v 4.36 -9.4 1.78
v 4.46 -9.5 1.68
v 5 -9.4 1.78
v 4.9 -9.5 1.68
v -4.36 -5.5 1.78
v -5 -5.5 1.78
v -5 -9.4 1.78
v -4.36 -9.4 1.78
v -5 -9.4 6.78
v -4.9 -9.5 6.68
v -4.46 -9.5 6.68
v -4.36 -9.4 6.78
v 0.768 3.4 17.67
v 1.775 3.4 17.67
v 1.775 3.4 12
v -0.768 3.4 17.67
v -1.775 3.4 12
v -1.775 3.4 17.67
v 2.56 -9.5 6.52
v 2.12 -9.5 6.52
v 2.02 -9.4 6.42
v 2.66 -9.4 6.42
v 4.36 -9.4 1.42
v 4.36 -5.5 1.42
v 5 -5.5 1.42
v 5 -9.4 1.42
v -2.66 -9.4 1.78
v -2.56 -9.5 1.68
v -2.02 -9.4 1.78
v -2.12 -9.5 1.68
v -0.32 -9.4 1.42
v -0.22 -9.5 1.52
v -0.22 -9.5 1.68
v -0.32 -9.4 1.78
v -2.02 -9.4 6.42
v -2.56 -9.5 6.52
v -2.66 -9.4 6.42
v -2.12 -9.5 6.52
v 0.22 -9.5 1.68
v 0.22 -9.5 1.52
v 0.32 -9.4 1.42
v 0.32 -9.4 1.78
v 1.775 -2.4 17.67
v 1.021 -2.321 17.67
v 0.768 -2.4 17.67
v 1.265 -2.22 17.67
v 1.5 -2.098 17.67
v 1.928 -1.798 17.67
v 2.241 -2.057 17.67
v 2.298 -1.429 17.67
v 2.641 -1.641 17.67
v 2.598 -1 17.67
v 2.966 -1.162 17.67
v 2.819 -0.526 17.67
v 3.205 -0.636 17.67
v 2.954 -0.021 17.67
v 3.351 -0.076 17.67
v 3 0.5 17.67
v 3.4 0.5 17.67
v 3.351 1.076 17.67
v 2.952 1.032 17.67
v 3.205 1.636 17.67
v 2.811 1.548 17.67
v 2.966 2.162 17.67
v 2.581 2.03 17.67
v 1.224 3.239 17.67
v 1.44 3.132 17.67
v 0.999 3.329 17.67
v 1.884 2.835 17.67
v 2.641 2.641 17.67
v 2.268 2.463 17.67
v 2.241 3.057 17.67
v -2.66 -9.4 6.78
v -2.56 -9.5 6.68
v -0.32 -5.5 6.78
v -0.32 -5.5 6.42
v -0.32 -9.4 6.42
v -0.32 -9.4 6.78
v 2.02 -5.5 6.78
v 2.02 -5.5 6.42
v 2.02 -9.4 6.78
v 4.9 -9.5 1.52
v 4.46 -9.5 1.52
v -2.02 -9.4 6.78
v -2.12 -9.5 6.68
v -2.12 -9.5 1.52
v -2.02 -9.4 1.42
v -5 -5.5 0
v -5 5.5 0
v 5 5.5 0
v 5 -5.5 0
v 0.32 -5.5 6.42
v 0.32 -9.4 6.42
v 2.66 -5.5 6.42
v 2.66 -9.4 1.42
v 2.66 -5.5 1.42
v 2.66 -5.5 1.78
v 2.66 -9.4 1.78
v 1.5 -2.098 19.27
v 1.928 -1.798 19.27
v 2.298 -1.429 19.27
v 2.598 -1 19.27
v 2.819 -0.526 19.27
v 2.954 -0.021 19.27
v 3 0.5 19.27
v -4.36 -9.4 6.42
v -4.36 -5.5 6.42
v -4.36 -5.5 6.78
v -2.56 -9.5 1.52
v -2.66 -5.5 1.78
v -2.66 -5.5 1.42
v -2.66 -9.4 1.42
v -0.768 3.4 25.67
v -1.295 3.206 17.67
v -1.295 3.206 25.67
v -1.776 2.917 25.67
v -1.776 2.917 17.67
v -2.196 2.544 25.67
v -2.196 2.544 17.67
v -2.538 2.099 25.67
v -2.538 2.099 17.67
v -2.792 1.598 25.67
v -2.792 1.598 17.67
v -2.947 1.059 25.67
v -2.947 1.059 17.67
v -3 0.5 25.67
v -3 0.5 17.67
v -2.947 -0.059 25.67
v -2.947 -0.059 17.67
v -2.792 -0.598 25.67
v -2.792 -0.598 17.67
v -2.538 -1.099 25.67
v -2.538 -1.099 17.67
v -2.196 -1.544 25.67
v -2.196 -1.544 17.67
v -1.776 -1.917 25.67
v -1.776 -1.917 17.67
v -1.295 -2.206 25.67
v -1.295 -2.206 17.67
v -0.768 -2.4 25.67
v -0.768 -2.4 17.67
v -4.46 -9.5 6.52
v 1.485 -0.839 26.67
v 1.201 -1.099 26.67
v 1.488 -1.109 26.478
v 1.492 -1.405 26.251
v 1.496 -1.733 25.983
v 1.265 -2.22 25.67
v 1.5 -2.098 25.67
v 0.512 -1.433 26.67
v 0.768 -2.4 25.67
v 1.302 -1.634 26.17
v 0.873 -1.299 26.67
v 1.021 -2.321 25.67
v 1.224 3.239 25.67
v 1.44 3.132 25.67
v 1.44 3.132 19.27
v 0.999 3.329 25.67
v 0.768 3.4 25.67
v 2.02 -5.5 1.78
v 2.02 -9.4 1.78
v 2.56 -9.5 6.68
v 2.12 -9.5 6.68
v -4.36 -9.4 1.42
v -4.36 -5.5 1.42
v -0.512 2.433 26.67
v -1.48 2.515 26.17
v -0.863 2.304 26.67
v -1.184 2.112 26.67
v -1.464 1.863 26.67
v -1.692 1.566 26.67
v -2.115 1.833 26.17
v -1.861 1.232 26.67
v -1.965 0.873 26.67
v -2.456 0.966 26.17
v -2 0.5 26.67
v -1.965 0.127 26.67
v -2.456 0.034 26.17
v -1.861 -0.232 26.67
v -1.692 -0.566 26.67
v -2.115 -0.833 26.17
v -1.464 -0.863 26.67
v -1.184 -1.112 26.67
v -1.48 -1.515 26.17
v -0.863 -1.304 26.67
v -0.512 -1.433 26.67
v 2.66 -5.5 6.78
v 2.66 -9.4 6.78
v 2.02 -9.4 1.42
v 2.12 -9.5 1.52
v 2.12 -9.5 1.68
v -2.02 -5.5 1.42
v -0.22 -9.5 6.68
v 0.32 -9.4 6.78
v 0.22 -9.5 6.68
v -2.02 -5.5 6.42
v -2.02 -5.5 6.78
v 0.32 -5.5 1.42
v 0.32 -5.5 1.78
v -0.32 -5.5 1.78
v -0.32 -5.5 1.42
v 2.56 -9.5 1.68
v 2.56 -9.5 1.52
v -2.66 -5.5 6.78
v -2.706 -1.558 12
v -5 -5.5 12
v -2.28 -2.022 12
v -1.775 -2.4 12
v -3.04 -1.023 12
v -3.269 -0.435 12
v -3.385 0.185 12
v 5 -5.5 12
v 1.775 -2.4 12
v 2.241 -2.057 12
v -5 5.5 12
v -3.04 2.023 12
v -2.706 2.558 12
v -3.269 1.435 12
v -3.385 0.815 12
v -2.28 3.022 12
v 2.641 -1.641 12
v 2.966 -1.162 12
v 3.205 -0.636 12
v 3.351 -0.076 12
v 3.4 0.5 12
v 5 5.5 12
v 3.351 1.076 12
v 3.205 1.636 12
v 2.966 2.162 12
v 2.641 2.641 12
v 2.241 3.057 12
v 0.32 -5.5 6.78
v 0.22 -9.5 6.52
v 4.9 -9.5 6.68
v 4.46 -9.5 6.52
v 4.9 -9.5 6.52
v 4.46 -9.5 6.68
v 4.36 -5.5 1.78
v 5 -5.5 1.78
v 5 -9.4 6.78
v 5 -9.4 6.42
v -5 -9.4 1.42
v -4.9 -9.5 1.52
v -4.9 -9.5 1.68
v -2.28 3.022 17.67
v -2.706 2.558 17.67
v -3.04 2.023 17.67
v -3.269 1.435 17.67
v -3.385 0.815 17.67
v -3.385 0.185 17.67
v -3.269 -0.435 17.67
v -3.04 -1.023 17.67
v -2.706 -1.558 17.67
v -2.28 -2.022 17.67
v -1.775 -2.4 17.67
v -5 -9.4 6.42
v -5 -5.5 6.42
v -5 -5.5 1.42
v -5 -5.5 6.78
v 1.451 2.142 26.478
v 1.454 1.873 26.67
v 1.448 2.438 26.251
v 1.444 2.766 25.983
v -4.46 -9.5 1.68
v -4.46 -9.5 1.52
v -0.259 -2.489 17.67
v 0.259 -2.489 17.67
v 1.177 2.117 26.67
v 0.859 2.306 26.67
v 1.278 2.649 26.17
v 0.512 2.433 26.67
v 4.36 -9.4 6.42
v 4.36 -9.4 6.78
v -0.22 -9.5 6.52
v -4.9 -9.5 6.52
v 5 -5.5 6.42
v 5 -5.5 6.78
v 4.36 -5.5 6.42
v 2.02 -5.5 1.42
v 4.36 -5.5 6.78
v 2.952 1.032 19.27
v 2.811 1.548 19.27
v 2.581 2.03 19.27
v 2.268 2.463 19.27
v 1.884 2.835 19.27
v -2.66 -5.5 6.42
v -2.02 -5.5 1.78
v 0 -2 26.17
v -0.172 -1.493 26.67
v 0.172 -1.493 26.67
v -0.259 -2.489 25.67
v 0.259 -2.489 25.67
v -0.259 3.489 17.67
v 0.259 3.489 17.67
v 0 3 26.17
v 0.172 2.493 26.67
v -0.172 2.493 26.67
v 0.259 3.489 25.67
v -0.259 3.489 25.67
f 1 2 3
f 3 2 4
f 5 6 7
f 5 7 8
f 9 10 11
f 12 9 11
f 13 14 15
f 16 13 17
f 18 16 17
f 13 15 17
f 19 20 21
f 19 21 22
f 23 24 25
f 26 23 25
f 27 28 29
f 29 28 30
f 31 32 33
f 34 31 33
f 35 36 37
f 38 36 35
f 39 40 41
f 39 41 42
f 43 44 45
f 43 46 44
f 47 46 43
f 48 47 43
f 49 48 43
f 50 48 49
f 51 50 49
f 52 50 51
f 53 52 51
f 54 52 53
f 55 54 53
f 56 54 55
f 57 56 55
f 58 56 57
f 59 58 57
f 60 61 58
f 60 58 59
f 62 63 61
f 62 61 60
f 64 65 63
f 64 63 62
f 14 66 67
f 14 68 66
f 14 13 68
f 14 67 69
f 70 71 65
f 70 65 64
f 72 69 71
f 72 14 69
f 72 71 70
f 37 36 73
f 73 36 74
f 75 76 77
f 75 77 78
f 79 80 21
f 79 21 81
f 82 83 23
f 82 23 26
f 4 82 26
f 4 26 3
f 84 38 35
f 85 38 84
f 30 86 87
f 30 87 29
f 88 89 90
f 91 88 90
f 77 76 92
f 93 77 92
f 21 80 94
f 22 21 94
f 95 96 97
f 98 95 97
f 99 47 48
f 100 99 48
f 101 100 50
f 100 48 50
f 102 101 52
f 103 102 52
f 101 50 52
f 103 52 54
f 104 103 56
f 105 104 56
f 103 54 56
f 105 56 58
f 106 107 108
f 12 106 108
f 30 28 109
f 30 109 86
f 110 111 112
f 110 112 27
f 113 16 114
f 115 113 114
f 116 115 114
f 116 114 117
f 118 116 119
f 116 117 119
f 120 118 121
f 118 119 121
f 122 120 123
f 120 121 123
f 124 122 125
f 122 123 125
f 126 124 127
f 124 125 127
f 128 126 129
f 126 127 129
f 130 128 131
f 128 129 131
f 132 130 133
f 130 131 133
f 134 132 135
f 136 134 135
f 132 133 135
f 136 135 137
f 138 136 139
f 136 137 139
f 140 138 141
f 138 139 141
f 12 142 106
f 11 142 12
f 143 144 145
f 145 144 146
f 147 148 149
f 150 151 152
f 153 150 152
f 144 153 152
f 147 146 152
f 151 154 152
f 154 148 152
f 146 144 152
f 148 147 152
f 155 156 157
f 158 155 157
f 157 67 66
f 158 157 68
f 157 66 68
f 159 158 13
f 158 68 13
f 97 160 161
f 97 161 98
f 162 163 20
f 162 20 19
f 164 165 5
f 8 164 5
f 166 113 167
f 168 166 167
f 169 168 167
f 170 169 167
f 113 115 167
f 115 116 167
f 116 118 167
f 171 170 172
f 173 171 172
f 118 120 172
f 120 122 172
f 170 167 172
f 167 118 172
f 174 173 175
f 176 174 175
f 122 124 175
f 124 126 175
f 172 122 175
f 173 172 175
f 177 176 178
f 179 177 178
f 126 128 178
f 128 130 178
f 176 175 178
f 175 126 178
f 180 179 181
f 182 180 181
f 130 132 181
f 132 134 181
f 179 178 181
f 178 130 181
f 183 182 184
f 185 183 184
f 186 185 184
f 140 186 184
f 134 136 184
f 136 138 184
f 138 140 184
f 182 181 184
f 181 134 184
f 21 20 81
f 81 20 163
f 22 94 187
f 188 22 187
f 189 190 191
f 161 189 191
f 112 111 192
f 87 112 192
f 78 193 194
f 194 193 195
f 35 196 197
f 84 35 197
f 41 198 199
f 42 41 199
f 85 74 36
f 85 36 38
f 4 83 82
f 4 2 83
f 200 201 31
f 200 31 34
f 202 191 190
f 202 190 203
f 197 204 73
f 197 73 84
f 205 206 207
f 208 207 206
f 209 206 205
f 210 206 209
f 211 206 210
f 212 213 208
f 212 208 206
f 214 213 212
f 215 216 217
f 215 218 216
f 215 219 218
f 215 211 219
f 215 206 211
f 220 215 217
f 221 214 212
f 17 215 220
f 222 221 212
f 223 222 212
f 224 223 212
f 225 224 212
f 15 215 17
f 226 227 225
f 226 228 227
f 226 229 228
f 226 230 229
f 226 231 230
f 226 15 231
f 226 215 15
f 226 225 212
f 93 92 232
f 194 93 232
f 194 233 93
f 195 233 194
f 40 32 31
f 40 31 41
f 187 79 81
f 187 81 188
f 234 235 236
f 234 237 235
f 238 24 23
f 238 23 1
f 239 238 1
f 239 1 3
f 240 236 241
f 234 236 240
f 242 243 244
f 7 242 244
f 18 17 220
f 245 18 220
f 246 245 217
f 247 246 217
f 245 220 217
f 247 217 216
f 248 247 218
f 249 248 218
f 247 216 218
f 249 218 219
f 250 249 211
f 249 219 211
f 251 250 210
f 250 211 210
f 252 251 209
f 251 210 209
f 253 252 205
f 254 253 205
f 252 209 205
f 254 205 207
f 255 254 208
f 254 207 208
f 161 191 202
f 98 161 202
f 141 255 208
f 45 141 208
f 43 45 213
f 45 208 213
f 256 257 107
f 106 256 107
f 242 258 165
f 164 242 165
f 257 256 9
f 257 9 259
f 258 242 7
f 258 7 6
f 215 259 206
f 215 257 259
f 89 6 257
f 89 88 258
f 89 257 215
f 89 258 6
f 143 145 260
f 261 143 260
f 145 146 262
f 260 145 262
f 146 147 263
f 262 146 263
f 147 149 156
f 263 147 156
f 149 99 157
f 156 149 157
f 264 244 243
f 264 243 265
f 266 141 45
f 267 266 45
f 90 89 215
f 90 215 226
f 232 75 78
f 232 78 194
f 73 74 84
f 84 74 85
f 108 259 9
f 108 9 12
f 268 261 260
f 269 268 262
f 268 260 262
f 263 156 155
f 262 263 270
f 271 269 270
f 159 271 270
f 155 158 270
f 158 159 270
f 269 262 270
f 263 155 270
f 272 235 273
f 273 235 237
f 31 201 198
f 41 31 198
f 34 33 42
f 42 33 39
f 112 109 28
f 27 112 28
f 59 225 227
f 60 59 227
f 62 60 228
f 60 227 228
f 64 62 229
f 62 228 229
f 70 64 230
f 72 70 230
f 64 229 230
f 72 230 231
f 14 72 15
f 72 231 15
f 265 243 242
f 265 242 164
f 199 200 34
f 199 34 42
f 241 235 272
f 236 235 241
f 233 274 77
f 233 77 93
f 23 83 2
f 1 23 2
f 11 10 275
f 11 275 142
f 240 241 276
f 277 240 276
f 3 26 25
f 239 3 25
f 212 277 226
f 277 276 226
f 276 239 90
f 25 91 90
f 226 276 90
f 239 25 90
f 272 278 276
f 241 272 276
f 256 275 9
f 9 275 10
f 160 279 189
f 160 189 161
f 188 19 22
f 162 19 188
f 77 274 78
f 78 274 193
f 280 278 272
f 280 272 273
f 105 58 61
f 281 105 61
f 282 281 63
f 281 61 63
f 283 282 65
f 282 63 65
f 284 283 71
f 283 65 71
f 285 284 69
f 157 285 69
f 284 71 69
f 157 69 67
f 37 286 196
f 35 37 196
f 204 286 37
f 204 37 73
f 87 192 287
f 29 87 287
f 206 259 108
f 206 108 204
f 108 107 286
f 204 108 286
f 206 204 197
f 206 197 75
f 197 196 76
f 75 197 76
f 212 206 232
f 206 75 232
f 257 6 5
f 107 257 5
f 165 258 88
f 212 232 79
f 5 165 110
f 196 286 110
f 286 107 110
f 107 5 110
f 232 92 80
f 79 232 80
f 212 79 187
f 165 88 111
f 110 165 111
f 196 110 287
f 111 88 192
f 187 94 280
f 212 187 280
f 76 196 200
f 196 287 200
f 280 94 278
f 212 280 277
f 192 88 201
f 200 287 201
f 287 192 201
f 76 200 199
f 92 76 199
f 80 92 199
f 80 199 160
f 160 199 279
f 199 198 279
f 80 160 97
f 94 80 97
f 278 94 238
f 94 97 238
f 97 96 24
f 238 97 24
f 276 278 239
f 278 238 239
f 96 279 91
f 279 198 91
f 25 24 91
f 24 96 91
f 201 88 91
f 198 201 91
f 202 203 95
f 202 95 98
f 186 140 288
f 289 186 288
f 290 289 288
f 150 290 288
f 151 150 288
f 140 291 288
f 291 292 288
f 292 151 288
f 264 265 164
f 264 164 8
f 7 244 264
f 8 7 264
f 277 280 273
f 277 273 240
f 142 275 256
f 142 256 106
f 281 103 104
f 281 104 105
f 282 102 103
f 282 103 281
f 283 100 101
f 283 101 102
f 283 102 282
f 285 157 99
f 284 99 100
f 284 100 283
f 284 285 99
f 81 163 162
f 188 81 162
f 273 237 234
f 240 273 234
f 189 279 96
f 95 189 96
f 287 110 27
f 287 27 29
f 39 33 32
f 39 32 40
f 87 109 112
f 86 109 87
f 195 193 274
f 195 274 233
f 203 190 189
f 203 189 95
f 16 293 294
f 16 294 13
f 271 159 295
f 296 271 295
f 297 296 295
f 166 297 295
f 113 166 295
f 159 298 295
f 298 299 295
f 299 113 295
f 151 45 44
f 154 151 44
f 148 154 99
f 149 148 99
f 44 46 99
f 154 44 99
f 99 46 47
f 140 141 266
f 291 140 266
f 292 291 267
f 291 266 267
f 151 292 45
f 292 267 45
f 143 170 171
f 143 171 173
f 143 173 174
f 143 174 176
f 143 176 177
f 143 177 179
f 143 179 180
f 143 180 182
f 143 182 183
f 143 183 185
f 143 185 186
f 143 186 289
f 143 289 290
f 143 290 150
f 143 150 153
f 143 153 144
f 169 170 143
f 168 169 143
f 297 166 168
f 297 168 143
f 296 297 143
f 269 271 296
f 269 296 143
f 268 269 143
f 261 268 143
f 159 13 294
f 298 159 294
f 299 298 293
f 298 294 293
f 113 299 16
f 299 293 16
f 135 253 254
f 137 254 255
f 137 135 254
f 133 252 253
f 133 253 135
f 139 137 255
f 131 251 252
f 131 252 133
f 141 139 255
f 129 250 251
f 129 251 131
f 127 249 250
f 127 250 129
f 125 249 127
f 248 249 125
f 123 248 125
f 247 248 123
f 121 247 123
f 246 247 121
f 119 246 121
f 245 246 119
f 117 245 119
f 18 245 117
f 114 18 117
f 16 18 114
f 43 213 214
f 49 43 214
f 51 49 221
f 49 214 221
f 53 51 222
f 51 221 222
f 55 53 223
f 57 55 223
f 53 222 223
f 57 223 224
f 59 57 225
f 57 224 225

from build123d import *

# Parameters (mm, degrees)
F0_W     = 10
F0_H     = 11
F1_DEPTH = 12
F3_DEPTH = 5.67
F5_DEPTH = 1.6
F6_DEPTH = 9
F7_SIZE  = 1
F8_W     = 0.64
F8_H     = 0.36
F9_DEPTH = 4
F10_SIZE = 0.1


with BuildPart() as f1:
    # F0 (on Top) → F1 (new body)
    with BuildSketch(Plane.XY):
        Rectangle(F0_W, F0_H)
    extrude(amount=F1_DEPTH)

    # F2 (on face) → F3 (join)
    with BuildSketch(Plane.XY.offset(12)):
        with BuildLine():
            ThreePointArc((1.7748239349, -2.4), (2.9660075336, -1.1621670526), (3.4, 0.5))
            ThreePointArc((3.4, 0.5), (2.9660075336, 2.1621670526), (1.7748239349, 3.4))
            Line((1.7748239349, 3.4), (-1.7748239349, 3.4))
            ThreePointArc((-1.7748239349, 3.4), (-3.4, 0.5), (-1.7748239349, -2.4))
            Line((-1.7748239349, -2.4), (1.7748239349, -2.4))
        make_face()
    extrude(amount=F3_DEPTH)

    # F4 (on face) → F5 (join)
    with BuildSketch(Plane.XY.offset(17.67)):
        with BuildLine():
            ThreePointArc((1.4997051578, -2.0982464163), (2.5979910963, -1.0001474139), (3, 0.5))
            ThreePointArc((3, 0.5), (2.5807277905, 2.0296548863), (1.4401039525, 3.1317485834))
            Line((1.4401039525, 3.1317485834), (1.4997051578, -2.0982464163))
        make_face()
    extrude(amount=F5_DEPTH)

    # F4 (on face) → F6 (join)
    with BuildSketch(Plane.XY.offset(17.67)):
        with BuildLine():
            Line((1.4997051578, -2.0982464163), (1.4401039525, 3.1317485834))
            ThreePointArc((1.4401039525, 3.1317485834), (1.1122261333, 3.2862076427), (0.7681145748, 3.4))
            Line((0.7681145748, 3.4), (-0.7681145748, 3.4))
            ThreePointArc((-0.7681145748, 3.4), (-3, 0.5), (-0.7681145748, -2.4))
            Line((-0.7681145748, -2.4), (0.7681145748, -2.4))
            ThreePointArc((0.7681145748, -2.4), (1.143903576, -2.2733525937), (1.4997051578, -2.0982464163))
        make_face()
        with BuildLine():
            ThreePointArc((-0.7681145748, -2.4), (0, -2.5), (0.7681145748, -2.4))
            Line((0.7681145748, -2.4), (-0.7681145748, -2.4))
        make_face()
        with BuildLine():
            Line((-0.7681145748, 3.4), (0.7681145748, 3.4))
            ThreePointArc((0.7681145748, 3.4), (0, 3.5), (-0.7681145748, 3.4))
        make_face()
    extrude(amount=F6_DEPTH)

    # F7
    f7_edges = [f1.edges().sort_by_distance(p)[0] for p in [
        (-2.999805, 0.465814, 26.67),
    ]]
    chamfer(f7_edges, length=F7_SIZE)

    # F8 (on face) → F9 (join)
    with BuildSketch(Plane.XZ.offset(5.5)):
        with Locations((-4.68, 6.6)):
            Rectangle(F8_W, F8_H)
        with Locations((-2.34, 6.6)):
            Rectangle(F8_W, F8_H)
        with Locations((0, 6.6)):
            Rectangle(F8_W, F8_H)
        with Locations((4.68, 1.6)):
            Rectangle(F8_W, F8_H)
        with Locations((2.34, 1.6)):
            Rectangle(F8_W, F8_H)
        with Locations((0, 1.6)):
            Rectangle(F8_W, F8_H)
        with Locations((-2.34, 1.6)):
            Rectangle(F8_W, F8_H)
        with Locations((-4.68, 1.6)):
            Rectangle(F8_W, F8_H)
        with Locations((2.34, 6.6)):
            Rectangle(F8_W, F8_H)
        with Locations((4.68, 6.6)):
            Rectangle(F8_W, F8_H)
    extrude(amount=F9_DEPTH)

    # F10
    f10_edges = [f1.edges().sort_by_distance(p)[0] for p in [
        (-5, -9.5, 6.6),
        (-4.68, -9.5, 6.42),
        (-4.36, -9.5, 6.6),
        (-4.68, -9.5, 6.78),
        (-2.66, -9.5, 6.6),
        (-2.34, -9.5, 6.42),
        (-2.02, -9.5, 6.6),
        (-2.34, -9.5, 6.78),
        (-0.32, -9.5, 6.6),
        (0, -9.5, 6.42),
        (0.32, -9.5, 6.6),
        (0, -9.5, 6.78),
        (2.02, -9.5, 6.6),
        (2.34, -9.5, 6.42),
        (2.66, -9.5, 6.6),
        (2.34, -9.5, 6.78),
        (4.68, -9.5, 6.42),
        (5, -9.5, 6.6),
        (4.68, -9.5, 6.78),
        (4.36, -9.5, 6.6),
        (4.68, -9.5, 1.42),
        (5, -9.5, 1.6),
        (4.68, -9.5, 1.78),
        (4.36, -9.5, 1.6),
        (2.02, -9.5, 1.6),
        (2.34, -9.5, 1.42),
        (2.66, -9.5, 1.6),
        (2.34, -9.5, 1.78),
        (-0.32, -9.5, 1.6),
        (0, -9.5, 1.42),
        (0.32, -9.5, 1.6),
        (0, -9.5, 1.78),
        (-2.66, -9.5, 1.6),
        (-2.34, -9.5, 1.42),
        (-2.02, -9.5, 1.6),
        (-2.34, -9.5, 1.78),
        (-5, -9.5, 1.6),
        (-4.68, -9.5, 1.42),
        (-4.36, -9.5, 1.6),
        (-4.68, -9.5, 1.78),
    ]]
    chamfer(f10_edges, length=F10_SIZE)


solid = f1.part
